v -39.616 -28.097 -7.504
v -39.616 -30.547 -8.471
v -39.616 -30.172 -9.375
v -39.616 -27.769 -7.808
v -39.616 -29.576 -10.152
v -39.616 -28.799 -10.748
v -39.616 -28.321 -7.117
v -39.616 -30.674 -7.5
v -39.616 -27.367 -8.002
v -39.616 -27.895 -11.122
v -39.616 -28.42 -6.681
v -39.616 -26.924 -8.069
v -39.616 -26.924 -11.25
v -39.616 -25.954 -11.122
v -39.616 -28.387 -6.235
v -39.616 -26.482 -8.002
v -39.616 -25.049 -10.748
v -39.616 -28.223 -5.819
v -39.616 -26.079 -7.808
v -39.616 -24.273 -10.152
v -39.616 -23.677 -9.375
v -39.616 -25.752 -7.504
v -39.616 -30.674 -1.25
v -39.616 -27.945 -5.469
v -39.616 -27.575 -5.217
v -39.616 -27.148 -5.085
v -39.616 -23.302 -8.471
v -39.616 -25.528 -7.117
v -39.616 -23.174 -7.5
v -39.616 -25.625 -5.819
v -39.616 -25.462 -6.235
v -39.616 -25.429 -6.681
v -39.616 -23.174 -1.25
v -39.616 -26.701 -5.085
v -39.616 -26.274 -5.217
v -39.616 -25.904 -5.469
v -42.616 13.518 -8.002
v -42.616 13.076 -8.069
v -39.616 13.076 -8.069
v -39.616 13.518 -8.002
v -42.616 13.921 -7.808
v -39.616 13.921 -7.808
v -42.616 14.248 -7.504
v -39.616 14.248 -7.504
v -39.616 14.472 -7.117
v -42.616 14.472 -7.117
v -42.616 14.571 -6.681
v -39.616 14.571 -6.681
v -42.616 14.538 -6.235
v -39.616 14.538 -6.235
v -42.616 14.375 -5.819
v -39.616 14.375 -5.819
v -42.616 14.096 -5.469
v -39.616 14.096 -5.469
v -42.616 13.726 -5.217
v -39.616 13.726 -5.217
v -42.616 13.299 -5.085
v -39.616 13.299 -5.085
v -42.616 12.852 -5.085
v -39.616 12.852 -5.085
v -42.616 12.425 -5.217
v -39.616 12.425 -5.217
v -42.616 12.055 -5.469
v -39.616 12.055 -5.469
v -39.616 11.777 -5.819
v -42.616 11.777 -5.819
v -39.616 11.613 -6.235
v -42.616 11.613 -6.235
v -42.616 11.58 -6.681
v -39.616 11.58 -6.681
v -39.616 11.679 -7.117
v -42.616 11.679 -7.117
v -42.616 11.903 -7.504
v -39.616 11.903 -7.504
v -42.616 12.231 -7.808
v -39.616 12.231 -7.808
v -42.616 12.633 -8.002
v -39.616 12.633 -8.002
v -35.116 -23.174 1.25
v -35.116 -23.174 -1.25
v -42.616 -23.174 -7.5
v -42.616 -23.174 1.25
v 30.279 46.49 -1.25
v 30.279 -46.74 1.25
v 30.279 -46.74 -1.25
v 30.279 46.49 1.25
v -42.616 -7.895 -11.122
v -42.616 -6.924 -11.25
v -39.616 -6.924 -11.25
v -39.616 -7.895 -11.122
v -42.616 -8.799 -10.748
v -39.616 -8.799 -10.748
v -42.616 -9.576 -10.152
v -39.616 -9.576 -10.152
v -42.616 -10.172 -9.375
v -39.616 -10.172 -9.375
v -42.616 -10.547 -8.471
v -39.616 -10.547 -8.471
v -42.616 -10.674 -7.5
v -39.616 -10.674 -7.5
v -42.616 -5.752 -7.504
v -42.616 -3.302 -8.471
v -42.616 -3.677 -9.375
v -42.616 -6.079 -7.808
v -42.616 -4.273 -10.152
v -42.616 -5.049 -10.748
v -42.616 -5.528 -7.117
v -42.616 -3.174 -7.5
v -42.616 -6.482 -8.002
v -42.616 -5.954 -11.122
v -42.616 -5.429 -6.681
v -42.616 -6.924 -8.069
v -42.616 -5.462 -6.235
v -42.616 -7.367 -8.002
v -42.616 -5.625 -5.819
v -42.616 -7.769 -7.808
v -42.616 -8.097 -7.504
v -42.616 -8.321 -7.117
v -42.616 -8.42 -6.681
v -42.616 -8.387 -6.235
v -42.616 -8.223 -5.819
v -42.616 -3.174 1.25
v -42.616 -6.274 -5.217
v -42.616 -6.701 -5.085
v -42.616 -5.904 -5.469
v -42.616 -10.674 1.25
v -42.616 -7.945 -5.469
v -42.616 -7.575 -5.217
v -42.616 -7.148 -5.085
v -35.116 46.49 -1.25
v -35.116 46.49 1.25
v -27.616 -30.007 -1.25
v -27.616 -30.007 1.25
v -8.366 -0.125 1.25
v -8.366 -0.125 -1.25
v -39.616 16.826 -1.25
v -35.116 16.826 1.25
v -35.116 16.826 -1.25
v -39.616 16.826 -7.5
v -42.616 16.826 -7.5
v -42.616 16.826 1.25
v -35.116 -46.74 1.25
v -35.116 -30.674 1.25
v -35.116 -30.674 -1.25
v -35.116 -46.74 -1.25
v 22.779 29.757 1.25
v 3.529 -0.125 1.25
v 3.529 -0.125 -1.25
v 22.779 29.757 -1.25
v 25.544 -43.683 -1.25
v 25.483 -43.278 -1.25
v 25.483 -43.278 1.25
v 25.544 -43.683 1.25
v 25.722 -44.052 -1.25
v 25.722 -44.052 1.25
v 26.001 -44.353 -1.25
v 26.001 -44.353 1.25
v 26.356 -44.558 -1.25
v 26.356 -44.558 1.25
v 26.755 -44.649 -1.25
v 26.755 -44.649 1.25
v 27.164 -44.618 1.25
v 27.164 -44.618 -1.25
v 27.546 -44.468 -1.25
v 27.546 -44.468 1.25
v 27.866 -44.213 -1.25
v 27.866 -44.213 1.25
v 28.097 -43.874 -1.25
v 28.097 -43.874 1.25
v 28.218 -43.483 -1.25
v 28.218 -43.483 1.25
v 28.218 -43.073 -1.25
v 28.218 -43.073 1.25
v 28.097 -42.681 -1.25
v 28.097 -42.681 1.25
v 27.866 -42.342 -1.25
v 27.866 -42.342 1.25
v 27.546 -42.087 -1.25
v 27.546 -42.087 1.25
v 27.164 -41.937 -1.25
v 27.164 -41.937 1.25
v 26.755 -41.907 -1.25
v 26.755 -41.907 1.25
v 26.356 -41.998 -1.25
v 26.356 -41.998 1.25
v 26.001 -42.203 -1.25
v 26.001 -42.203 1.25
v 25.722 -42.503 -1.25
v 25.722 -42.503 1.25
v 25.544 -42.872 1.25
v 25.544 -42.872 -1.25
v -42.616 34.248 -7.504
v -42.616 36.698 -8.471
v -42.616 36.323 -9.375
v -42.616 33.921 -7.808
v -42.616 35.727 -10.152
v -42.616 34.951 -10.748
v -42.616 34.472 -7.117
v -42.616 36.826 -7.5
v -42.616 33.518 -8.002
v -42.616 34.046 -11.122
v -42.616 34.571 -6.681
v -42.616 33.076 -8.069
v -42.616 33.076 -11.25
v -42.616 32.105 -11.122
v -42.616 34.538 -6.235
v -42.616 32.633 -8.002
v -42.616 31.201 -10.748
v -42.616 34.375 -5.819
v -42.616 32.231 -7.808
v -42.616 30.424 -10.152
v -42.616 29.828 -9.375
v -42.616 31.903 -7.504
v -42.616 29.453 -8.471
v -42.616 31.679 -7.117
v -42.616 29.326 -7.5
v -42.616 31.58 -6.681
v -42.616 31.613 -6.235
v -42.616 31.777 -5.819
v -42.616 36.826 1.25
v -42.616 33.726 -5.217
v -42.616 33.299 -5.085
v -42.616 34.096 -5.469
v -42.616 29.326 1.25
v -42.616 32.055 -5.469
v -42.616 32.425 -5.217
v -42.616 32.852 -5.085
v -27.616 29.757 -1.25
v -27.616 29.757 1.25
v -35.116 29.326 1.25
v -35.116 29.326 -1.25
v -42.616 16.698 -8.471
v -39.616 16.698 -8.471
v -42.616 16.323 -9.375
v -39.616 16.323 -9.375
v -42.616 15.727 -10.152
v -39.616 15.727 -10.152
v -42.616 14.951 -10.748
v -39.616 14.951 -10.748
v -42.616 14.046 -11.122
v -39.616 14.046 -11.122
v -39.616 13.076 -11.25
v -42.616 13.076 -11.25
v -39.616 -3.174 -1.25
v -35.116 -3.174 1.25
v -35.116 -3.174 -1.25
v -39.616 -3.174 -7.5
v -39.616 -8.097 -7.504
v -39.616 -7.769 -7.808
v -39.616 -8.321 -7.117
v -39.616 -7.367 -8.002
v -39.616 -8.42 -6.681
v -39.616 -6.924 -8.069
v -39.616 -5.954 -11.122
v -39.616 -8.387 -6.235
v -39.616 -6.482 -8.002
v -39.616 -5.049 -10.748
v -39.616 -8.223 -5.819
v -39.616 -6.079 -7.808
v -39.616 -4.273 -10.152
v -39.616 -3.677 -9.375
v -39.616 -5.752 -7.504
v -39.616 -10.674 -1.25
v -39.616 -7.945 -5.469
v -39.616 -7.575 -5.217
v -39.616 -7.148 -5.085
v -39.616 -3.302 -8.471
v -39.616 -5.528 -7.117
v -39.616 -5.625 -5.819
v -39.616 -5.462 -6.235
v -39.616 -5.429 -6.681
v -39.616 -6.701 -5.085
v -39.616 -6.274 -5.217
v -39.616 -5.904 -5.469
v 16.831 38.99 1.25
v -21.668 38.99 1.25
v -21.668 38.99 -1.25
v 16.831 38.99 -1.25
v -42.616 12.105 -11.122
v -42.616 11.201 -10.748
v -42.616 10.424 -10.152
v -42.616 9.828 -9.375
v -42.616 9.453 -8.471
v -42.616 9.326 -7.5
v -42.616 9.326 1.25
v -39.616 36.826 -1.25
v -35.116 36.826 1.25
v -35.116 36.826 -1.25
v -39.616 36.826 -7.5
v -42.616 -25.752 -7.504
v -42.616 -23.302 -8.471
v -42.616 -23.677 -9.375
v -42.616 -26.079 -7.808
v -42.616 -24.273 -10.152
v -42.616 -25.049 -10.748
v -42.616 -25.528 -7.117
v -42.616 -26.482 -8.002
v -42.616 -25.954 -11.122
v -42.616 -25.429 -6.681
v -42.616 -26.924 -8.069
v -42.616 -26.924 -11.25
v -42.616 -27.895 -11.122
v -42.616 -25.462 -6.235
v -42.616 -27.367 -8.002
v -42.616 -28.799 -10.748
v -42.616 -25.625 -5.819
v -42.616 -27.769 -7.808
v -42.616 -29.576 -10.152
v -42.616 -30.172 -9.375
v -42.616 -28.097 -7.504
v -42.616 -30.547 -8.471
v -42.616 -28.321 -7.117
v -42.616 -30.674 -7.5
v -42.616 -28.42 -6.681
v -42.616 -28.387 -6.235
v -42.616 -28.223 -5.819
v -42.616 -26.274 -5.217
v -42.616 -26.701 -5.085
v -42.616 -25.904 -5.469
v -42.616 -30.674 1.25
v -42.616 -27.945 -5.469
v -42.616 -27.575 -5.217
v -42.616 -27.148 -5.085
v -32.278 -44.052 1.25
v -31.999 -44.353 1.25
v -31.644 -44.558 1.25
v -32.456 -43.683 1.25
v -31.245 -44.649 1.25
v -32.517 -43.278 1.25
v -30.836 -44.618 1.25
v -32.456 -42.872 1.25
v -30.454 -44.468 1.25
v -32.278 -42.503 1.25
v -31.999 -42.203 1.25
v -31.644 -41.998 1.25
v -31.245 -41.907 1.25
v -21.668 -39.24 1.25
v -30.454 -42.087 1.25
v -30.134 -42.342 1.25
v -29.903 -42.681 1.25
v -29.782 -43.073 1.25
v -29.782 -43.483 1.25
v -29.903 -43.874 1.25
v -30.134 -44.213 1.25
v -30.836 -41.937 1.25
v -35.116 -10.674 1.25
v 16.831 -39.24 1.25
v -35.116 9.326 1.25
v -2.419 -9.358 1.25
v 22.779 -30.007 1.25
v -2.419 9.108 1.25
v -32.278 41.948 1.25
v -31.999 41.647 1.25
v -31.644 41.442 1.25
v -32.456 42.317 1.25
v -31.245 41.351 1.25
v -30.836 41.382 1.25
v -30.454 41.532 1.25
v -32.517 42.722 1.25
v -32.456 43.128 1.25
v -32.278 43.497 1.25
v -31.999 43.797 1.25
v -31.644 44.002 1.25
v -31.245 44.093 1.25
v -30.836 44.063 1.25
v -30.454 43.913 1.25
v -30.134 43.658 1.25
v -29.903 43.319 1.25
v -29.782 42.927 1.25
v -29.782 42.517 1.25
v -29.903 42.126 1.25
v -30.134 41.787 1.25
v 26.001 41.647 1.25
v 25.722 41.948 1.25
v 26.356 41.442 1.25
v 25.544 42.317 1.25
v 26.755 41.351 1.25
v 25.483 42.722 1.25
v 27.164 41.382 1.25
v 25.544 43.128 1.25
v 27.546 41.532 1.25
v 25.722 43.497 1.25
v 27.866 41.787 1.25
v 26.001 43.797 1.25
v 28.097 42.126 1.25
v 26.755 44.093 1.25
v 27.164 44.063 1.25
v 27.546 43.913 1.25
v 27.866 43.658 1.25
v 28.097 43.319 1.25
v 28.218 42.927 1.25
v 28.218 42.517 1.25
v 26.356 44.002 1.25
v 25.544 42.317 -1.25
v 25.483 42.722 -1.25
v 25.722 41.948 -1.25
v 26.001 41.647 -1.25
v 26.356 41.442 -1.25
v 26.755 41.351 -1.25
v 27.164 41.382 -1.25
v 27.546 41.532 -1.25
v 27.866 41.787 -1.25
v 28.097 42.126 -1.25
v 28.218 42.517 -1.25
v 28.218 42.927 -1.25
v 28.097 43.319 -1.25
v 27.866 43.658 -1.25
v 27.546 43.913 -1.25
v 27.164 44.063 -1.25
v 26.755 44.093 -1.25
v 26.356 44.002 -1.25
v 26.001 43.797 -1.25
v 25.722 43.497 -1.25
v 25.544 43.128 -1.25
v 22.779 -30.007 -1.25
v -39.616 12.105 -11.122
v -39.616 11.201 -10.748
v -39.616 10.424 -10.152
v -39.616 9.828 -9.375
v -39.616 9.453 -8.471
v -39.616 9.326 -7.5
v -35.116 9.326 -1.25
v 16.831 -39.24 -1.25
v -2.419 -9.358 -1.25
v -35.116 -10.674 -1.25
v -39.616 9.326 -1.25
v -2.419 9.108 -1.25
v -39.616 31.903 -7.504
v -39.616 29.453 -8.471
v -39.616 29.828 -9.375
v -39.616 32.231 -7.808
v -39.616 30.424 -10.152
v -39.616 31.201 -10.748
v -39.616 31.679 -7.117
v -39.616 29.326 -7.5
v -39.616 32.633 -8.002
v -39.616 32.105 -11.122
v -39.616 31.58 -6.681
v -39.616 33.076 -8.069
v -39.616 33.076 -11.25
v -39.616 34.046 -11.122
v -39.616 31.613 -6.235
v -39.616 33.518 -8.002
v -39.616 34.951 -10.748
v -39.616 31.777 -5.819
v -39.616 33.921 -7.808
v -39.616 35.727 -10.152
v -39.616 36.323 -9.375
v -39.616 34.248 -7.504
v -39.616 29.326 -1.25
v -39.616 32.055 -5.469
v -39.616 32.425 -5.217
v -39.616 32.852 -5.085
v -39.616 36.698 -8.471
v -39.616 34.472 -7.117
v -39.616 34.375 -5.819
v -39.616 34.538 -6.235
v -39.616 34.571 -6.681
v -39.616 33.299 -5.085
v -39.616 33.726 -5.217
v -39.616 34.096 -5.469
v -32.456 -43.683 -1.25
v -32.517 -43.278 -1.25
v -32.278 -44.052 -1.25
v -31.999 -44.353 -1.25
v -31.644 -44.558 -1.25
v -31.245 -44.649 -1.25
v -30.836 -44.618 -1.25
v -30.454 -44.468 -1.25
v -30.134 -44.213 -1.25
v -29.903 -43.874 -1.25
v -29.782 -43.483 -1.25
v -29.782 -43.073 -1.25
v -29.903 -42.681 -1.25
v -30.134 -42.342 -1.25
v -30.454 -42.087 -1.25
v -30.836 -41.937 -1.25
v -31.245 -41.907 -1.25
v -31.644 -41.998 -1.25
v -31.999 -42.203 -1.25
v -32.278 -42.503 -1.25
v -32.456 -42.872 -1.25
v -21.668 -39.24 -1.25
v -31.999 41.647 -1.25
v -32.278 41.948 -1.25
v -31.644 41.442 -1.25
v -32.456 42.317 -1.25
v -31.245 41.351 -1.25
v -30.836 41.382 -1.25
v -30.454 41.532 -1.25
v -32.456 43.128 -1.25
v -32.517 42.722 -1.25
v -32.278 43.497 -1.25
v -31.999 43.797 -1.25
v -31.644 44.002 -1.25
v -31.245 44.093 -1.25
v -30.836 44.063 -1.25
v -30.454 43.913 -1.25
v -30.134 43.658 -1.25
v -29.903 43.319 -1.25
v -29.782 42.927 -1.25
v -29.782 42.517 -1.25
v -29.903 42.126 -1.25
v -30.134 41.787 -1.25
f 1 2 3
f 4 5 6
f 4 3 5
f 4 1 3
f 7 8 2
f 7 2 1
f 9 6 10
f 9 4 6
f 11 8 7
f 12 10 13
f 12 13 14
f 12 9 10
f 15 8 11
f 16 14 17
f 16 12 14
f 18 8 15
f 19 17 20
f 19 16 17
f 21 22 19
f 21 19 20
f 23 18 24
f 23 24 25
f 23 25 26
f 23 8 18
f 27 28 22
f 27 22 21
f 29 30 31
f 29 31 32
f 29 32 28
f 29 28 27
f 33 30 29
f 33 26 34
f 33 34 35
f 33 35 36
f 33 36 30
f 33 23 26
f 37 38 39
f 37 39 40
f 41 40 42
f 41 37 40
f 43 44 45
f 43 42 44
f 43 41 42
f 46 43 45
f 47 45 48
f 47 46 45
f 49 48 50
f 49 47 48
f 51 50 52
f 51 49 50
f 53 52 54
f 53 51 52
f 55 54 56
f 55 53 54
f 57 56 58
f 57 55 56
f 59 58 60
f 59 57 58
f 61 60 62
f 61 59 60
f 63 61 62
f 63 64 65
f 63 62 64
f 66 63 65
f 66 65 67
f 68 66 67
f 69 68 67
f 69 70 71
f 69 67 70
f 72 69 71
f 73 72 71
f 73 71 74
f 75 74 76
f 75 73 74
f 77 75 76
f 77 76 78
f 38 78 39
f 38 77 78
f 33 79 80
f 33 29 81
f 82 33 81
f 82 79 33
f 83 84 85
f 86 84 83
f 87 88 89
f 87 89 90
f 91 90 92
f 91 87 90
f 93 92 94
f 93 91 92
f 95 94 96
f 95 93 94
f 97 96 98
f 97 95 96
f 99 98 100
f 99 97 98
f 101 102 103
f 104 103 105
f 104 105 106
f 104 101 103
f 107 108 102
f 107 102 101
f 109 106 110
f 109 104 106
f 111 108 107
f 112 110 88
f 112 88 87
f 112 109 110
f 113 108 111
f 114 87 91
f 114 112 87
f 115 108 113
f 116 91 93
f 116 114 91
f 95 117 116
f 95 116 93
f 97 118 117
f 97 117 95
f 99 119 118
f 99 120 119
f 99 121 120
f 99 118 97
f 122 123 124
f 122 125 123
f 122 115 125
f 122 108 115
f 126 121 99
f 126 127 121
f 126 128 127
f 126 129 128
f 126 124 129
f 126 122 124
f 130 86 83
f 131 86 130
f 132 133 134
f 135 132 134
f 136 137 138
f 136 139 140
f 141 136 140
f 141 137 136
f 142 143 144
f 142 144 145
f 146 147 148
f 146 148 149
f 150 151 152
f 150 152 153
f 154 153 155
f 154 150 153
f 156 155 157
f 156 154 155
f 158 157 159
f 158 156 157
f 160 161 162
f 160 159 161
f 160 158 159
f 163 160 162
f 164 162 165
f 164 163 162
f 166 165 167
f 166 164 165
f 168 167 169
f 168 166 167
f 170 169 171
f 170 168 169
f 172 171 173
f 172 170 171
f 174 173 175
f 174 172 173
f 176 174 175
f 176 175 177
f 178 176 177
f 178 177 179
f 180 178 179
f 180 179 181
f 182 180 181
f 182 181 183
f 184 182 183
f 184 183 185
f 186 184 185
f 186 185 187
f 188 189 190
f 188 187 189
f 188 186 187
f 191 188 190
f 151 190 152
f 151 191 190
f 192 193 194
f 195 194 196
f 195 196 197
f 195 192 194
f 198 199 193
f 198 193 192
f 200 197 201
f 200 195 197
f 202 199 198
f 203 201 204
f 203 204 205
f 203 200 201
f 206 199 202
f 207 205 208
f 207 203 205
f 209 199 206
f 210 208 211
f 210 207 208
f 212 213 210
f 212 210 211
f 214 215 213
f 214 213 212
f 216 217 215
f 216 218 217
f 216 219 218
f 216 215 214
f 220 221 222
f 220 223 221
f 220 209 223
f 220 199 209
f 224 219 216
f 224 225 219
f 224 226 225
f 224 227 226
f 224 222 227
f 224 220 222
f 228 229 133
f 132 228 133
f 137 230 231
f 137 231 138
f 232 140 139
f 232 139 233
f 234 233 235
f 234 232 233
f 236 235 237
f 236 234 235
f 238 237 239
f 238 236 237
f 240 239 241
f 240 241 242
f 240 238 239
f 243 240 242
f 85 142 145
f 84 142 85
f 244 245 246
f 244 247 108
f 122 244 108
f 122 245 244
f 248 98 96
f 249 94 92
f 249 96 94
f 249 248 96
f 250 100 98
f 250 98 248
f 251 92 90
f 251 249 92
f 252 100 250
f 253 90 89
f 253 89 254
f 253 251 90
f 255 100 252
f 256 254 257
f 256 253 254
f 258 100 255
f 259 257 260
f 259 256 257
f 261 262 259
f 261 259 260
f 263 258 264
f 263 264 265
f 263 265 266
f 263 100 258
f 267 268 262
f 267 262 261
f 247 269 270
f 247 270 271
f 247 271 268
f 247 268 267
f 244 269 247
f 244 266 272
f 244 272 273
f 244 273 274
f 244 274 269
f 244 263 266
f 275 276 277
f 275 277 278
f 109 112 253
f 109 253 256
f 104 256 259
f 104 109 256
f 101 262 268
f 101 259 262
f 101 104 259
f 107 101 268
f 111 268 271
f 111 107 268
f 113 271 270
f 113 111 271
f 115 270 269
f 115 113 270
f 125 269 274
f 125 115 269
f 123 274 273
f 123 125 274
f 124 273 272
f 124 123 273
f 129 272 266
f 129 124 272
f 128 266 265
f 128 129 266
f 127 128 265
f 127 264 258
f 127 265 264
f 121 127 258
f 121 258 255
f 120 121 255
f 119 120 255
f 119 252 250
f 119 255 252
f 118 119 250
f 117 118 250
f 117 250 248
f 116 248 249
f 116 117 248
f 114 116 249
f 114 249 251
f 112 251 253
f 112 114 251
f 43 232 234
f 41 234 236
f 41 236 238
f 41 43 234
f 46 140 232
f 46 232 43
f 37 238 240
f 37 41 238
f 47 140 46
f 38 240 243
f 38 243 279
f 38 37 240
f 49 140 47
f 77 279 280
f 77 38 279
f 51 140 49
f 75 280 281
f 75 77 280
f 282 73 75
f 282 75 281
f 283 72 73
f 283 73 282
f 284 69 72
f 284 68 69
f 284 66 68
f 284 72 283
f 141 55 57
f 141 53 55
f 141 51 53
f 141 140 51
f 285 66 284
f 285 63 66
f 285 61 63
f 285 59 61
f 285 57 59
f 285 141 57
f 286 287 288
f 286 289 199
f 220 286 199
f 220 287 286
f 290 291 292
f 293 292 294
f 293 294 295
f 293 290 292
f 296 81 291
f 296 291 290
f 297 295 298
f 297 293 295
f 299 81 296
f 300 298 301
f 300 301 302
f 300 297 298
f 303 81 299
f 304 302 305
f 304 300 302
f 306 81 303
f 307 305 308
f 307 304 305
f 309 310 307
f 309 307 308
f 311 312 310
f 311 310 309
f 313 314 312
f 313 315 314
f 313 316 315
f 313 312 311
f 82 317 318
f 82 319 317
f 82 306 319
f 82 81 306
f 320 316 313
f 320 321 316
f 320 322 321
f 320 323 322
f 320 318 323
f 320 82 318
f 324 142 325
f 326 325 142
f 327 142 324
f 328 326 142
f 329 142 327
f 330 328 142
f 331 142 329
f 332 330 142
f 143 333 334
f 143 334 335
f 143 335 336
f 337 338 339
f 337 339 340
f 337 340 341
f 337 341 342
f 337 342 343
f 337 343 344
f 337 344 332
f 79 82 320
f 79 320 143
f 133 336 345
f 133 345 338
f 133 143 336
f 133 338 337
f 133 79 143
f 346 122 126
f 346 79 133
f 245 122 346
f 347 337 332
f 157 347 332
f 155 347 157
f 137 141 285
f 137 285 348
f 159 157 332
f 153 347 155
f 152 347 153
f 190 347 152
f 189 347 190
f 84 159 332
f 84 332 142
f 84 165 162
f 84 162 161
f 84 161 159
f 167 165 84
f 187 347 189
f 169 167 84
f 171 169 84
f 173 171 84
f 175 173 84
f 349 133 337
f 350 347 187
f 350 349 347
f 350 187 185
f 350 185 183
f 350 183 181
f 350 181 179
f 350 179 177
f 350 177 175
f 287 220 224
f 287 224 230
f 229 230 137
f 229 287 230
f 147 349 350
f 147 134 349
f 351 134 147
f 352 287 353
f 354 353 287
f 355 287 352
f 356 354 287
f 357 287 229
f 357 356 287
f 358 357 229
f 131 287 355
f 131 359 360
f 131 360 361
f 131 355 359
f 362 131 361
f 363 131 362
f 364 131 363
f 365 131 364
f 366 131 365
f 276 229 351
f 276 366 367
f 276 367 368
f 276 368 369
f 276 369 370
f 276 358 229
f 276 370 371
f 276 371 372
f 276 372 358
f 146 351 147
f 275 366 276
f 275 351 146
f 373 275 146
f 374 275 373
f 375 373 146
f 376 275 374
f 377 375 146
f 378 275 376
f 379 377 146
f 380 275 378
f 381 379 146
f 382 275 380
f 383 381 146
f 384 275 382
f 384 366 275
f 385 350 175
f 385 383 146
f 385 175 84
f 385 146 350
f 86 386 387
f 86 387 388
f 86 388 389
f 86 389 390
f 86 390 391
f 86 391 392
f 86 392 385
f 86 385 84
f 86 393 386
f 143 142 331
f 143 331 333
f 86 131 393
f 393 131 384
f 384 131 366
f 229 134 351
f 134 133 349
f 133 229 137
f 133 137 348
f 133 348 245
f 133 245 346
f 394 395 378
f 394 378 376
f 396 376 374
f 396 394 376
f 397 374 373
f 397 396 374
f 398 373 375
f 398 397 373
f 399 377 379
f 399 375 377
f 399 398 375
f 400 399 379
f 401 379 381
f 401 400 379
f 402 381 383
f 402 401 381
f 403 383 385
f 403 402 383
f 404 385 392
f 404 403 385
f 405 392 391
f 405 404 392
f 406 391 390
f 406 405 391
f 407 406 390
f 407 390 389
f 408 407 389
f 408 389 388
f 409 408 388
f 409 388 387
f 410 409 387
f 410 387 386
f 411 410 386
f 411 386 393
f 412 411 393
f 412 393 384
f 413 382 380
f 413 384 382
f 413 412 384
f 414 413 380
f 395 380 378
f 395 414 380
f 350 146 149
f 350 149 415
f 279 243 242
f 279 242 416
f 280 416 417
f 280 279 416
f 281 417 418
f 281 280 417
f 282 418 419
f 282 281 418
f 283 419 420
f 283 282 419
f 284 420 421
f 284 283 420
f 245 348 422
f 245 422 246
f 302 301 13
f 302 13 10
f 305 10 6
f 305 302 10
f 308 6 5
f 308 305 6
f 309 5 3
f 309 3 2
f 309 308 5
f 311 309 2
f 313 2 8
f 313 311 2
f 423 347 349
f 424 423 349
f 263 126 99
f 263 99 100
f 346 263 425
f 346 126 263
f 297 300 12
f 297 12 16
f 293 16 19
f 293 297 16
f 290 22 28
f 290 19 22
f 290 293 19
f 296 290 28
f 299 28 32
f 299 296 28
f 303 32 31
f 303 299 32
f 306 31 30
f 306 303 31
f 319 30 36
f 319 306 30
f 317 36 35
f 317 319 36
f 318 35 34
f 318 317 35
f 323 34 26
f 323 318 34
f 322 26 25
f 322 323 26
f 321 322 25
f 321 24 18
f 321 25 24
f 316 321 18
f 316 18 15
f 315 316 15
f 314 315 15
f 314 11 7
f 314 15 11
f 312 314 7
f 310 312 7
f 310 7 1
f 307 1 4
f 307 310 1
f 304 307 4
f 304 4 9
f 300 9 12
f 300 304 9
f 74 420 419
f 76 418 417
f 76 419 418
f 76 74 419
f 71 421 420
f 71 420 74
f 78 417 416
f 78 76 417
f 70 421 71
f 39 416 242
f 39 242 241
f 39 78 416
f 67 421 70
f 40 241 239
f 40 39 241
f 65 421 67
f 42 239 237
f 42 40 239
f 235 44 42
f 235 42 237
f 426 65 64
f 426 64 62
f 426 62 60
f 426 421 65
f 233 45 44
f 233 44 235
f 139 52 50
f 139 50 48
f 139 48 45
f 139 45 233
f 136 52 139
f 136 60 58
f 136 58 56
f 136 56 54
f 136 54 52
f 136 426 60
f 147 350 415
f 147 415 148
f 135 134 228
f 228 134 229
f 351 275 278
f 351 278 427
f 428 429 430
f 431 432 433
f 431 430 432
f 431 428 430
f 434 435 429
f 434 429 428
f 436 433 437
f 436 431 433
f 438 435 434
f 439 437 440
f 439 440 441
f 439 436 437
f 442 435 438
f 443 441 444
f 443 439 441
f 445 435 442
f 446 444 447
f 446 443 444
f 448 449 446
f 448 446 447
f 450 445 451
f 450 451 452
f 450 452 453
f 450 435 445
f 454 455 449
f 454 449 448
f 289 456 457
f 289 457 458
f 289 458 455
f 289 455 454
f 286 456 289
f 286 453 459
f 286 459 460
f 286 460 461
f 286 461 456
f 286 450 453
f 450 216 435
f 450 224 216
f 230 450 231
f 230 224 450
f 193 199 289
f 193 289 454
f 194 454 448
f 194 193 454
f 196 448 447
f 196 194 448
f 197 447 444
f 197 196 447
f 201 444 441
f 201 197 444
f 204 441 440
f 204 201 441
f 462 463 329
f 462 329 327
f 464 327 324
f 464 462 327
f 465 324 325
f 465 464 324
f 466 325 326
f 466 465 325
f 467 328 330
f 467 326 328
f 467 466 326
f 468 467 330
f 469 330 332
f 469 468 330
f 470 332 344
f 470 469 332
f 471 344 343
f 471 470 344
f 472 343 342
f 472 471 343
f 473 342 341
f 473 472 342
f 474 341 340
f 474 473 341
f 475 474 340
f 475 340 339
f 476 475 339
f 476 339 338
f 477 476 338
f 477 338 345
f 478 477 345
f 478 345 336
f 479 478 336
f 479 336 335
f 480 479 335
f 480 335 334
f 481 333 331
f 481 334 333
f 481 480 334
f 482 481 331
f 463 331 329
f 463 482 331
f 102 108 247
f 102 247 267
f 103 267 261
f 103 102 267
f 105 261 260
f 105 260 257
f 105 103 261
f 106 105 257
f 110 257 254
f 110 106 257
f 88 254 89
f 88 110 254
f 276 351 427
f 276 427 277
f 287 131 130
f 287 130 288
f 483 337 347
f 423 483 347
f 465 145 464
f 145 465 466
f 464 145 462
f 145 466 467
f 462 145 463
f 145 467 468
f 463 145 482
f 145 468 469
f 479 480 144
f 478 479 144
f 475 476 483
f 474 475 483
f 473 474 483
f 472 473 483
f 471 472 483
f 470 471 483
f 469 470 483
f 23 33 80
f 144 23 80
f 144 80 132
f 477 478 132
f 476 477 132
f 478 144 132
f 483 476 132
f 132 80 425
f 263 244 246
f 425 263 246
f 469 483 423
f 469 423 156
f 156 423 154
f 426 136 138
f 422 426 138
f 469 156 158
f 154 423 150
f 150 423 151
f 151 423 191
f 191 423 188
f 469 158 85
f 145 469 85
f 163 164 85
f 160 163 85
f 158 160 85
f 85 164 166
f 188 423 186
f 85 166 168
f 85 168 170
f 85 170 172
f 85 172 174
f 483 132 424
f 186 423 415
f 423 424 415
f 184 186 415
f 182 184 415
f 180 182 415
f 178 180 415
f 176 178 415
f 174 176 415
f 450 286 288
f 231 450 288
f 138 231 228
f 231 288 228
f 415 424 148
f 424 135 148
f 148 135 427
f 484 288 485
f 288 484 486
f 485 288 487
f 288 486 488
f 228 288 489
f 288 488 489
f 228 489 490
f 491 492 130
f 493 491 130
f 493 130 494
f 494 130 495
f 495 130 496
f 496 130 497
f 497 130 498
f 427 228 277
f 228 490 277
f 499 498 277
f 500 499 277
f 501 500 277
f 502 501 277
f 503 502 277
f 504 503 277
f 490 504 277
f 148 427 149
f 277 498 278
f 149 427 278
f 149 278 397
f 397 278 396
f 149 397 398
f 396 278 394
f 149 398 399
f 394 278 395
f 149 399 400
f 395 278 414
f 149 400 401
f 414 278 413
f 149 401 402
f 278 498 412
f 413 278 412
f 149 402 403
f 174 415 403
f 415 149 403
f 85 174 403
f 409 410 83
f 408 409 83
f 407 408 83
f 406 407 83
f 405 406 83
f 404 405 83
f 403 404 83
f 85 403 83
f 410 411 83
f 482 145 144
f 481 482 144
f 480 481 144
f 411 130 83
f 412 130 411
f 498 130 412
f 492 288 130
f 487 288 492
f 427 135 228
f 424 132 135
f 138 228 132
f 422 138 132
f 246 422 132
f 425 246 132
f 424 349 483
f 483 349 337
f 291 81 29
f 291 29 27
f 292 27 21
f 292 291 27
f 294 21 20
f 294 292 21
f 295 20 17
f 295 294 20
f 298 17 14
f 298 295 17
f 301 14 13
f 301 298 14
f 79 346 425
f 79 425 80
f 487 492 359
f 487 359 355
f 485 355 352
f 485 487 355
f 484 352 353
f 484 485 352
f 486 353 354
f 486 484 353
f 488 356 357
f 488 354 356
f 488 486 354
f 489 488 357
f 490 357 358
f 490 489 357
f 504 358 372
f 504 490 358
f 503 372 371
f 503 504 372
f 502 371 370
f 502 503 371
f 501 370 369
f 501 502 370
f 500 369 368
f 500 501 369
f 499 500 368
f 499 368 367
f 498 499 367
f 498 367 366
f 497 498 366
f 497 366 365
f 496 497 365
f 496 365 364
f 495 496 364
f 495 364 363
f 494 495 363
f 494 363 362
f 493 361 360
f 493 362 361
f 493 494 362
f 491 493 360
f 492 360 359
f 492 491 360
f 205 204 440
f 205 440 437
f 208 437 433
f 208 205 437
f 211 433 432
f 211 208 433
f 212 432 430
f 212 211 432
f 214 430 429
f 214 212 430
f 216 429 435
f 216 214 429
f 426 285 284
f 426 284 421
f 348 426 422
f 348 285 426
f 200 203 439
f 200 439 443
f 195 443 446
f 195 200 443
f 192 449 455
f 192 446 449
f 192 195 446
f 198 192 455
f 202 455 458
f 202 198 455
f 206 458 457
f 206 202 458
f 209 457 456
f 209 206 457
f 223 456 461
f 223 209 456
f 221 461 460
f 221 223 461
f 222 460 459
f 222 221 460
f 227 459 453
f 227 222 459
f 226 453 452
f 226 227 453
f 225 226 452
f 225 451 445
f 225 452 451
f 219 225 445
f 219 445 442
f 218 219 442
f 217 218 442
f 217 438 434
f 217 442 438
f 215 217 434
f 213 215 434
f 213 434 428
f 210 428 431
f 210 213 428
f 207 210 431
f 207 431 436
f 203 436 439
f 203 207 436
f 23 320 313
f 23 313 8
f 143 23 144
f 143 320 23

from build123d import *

# Parameters (mm, degrees)
SKETCH1_W                = 90
SKETCH1_H                = 100
BOSS_EXTRUDE1_DEPTH      = 1.25
CUT_EXTRUDE2_DEPTH       = 68.314560089
CUT_EXTRUDE2_DEPTH_BACK  = 68.314560089
SKETCH3_W                = 120.524160128
SKETCH3_H                = 121.100830751
SKETCH3_W_2              = 90
SKETCH3_H_2              = 100
BOSS_EXTRUDE2_DEPTH      = 10
BOSS_EXTRUDE2_DEPTH_BACK = 1
SKETCH4_W                = 3
SKETCH4_H                = 7.5
CUT_EXTRUDE4_DEPTH       = 85.83221669
CUT_EXTRUDE4_DEPTH_BACK  = 85.83221669
SKETCH6_R                = 1.5
HOLDER_SCREW_DEPTH       = 65.47473997
HOLDER_SCREW_DEPTH_BACK  = 65.47473997
SKETCH11_R               = 1.375


with BuildPart() as part:
    # Sketch1 → Boss-Extrude1 (new, symmetric)
    with BuildSketch(Plane.XY):
        Rectangle(SKETCH1_W, SKETCH1_H)
    extrude(amount=BOSS_EXTRUDE1_DEPTH, both=True)

    # Sketch3 → Cut-Extrude2 (cut, two sides: drawn at the far end of the back side and taken through both)
    # profile 1 of 6: a face of its own
    with BuildSketch(Plane(origin=(0, 0, -1.25), x_dir=(-1, 0, 0), z_dir=(0, 0, -1)).offset(-CUT_EXTRUDE2_DEPTH_BACK)):
        with Locations((6.594005418, 0.079563665)):
            Rectangle(SKETCH3_W, SKETCH3_H)
        Rectangle(SKETCH3_W_2, SKETCH3_H_2, mode=Mode.SUBTRACT)
    # profile 2 of 6: a face of its own
    with BuildSketch(Plane(origin=(0, 0, -1.25), x_dir=(-1, 0, 0), z_dir=(0, 0, -1)).offset(-CUT_EXTRUDE2_DEPTH_BACK)):
        Rectangle(SKETCH3_W_2, SKETCH3_H_2)
        Polygon((42.616130373, -30.674442955), (35.116130373, -30.674442955), (35.116130373, -33.902086325), (35.116130373, -46.739785261), (-30.279040864, -46.739785261), (-30.279040864, 46.489928229), (35.116130373, 46.489928229), (35.116130373, 36.825557045), (42.616130373, 36.825557045), (42.616130373, 29.325557045), (35.116130373, 29.325557045), (35.116130373, 16.825557045), (42.616130373, 16.825557045), (42.616130373, 9.325557045), (35.116130373, 9.325557045), (35.116130373, -3.174442955), (42.616130373, -3.174442955), (42.616130373, -10.674442955), (35.116130373, -10.674442955), (35.116130373, -23.174442955), (42.616130373, -23.174442955), align=None, mode=Mode.SUBTRACT)
    # profile 3 of 6: a face of its own
    with BuildSketch(Plane(origin=(0, 0, -1.25), x_dir=(-1, 0, 0), z_dir=(0, 0, -1)).offset(-CUT_EXTRUDE2_DEPTH_BACK)):
        Polygon((-16.831379802, 38.989928229), (2.418544754, 9.1077779), (21.668469311, 38.989928229), align=None)
    # profile 4 of 6: a face of its own
    with BuildSketch(Plane(origin=(0, 0, -1.25), x_dir=(-1, 0, 0), z_dir=(0, 0, -1)).offset(-CUT_EXTRUDE2_DEPTH_BACK)):
        Polygon((-22.779040864, 29.757221813), (-22.779040864, -30.007078845), (-3.529116308, -0.124928516), align=None)
    # profile 5 of 6: a face of its own
    with BuildSketch(Plane(origin=(0, 0, -1.25), x_dir=(-1, 0, 0), z_dir=(0, 0, -1)).offset(-CUT_EXTRUDE2_DEPTH_BACK)):
        Polygon((2.418544754, -9.357634932), (21.668469311, -39.239785261), (-16.831379802, -39.239785261), align=None)
    # profile 6 of 6: a face of its own
    with BuildSketch(Plane(origin=(0, 0, -1.25), x_dir=(-1, 0, 0), z_dir=(0, 0, -1)).offset(-CUT_EXTRUDE2_DEPTH_BACK)):
        Polygon((8.366205816, -0.124928516), (27.616130373, 29.757221813), (27.616130373, -30.007078845), align=None)
    extrude(amount=CUT_EXTRUDE2_DEPTH + CUT_EXTRUDE2_DEPTH_BACK, mode=Mode.SUBTRACT)

    # Sketch4 → Boss-Extrude2 (add, two sides: drawn at the far end of the back side and taken through both)
    with BuildSketch(Plane(origin=(0, 0, -1.25), x_dir=(-1, 0, 0), z_dir=(0, 0, -1)).offset(-BOSS_EXTRUDE2_DEPTH_BACK)):
        with Locations((41.116130373, 33.075557045)):
            Rectangle(SKETCH4_W, SKETCH4_H)
        with Locations((41.116130373, 13.075557045)):
            Rectangle(SKETCH4_W, SKETCH4_H)
        with Locations((41.116130373, -6.924442955)):
            Rectangle(SKETCH4_W, SKETCH4_H)
        with Locations((41.116130373, -26.924442955)):
            Rectangle(SKETCH4_W, SKETCH4_H)
    extrude(amount=BOSS_EXTRUDE2_DEPTH + BOSS_EXTRUDE2_DEPTH_BACK)

    # Sketch6 → Cut-Extrude4 (cut, two sides: drawn at the far end of the back side and taken through both)
    with BuildSketch(Plane(origin=(-39.616130373, 0, 0), x_dir=(0, 0, -1), z_dir=(1, 0, 0)).offset(-CUT_EXTRUDE4_DEPTH_BACK)):
        with Locations((6.568537773, 33.075557045)):
            Circle(SKETCH6_R)
        with BuildLine():
            Line((11.25, 33.075557045), (11.25, 36.825557045))
            Line((11.25, 36.825557045), (7.5, 36.825557045))
            ThreePointArc((7.5, 36.825557045), (10.151650429, 35.727207475), (11.25, 33.075557045))
        make_face()
        with BuildLine():
            Line((11.25, 29.325557045), (11.25, 33.075557045))
            ThreePointArc((11.25, 33.075557045), (10.151650429, 30.423906616), (7.5, 29.325557045))
            Line((7.5, 29.325557045), (11.25, 29.325557045))
        make_face()
        with Locations((6.568537773, 13.075557045)):
            Circle(SKETCH6_R)
        with BuildLine():
            Line((11.25, 9.325557045), (11.25, 13.075557045))
            ThreePointArc((11.25, 13.075557045), (10.151650429, 10.423906616), (7.5, 9.325557045))
            Line((7.5, 9.325557045), (11.25, 9.325557045))
        make_face()
        with BuildLine():
            Line((11.25, 13.075557045), (11.25, 16.825557045))
            Line((11.25, 16.825557045), (7.5, 16.825557045))
            ThreePointArc((7.5, 16.825557045), (10.151650429, 15.727207475), (11.25, 13.075557045))
        make_face()
        with BuildLine():
            Line((11.25, -6.924442955), (11.25, -3.174442955))
            Line((11.25, -3.174442955), (7.5, -3.174442955))
            ThreePointArc((7.5, -3.174442955), (10.151650429, -4.272792525), (11.25, -6.924442955))
        make_face()
        with Locations((6.568537773, -6.924442955)):
            Circle(SKETCH6_R)
        with BuildLine():
            Line((11.25, -10.674442955), (11.25, -6.924442955))
            ThreePointArc((11.25, -6.924442955), (10.151650429, -9.576093384), (7.5, -10.674442955))
            Line((7.5, -10.674442955), (11.25, -10.674442955))
        make_face()
        with BuildLine():
            Line((11.25, -30.674442955), (11.25, -26.924442971))
            ThreePointArc((11.25, -26.924442971), (10.151650424, -29.57609339), (7.5, -30.674442955))
            Line((7.5, -30.674442955), (11.25, -30.674442955))
        make_face()
        with Locations((6.568537773, -26.924442955)):
            Circle(SKETCH6_R)
        with BuildLine():
            Line((11.25, -26.924442971), (11.25, -23.174442955))
            Line((11.25, -23.174442955), (7.5, -23.174442955))
            ThreePointArc((7.5, -23.174442955), (10.151650435, -24.272792531), (11.25, -26.924442971))
        make_face()
    extrude(amount=CUT_EXTRUDE4_DEPTH + CUT_EXTRUDE4_DEPTH_BACK, mode=Mode.SUBTRACT)

    # Sketch11 → Holder_Screw (cut, two sides: drawn at the far end of the back side and taken through both)
    with BuildSketch(Plane.XY.offset(1.25).offset(-HOLDER_SCREW_DEPTH_BACK)):
        with Locations(Location((-31.1419152, 42.7222856, 0), (0, 0, 180))):
            Circle(SKETCH11_R)
        with Locations(Location((26.8580848, 42.7222856, 0), (0, 0, 180))):
            Circle(SKETCH11_R)
        with Locations(Location((26.8580848, -43.2777144, 0), (0, 0, 180))):
            Circle(SKETCH11_R)
        with Locations(Location((-31.1419152, -43.2777144, 0), (0, 0, 180))):
            Circle(SKETCH11_R)
    extrude(amount=HOLDER_SCREW_DEPTH + HOLDER_SCREW_DEPTH_BACK, mode=Mode.SUBTRACT)


solid = part.part
